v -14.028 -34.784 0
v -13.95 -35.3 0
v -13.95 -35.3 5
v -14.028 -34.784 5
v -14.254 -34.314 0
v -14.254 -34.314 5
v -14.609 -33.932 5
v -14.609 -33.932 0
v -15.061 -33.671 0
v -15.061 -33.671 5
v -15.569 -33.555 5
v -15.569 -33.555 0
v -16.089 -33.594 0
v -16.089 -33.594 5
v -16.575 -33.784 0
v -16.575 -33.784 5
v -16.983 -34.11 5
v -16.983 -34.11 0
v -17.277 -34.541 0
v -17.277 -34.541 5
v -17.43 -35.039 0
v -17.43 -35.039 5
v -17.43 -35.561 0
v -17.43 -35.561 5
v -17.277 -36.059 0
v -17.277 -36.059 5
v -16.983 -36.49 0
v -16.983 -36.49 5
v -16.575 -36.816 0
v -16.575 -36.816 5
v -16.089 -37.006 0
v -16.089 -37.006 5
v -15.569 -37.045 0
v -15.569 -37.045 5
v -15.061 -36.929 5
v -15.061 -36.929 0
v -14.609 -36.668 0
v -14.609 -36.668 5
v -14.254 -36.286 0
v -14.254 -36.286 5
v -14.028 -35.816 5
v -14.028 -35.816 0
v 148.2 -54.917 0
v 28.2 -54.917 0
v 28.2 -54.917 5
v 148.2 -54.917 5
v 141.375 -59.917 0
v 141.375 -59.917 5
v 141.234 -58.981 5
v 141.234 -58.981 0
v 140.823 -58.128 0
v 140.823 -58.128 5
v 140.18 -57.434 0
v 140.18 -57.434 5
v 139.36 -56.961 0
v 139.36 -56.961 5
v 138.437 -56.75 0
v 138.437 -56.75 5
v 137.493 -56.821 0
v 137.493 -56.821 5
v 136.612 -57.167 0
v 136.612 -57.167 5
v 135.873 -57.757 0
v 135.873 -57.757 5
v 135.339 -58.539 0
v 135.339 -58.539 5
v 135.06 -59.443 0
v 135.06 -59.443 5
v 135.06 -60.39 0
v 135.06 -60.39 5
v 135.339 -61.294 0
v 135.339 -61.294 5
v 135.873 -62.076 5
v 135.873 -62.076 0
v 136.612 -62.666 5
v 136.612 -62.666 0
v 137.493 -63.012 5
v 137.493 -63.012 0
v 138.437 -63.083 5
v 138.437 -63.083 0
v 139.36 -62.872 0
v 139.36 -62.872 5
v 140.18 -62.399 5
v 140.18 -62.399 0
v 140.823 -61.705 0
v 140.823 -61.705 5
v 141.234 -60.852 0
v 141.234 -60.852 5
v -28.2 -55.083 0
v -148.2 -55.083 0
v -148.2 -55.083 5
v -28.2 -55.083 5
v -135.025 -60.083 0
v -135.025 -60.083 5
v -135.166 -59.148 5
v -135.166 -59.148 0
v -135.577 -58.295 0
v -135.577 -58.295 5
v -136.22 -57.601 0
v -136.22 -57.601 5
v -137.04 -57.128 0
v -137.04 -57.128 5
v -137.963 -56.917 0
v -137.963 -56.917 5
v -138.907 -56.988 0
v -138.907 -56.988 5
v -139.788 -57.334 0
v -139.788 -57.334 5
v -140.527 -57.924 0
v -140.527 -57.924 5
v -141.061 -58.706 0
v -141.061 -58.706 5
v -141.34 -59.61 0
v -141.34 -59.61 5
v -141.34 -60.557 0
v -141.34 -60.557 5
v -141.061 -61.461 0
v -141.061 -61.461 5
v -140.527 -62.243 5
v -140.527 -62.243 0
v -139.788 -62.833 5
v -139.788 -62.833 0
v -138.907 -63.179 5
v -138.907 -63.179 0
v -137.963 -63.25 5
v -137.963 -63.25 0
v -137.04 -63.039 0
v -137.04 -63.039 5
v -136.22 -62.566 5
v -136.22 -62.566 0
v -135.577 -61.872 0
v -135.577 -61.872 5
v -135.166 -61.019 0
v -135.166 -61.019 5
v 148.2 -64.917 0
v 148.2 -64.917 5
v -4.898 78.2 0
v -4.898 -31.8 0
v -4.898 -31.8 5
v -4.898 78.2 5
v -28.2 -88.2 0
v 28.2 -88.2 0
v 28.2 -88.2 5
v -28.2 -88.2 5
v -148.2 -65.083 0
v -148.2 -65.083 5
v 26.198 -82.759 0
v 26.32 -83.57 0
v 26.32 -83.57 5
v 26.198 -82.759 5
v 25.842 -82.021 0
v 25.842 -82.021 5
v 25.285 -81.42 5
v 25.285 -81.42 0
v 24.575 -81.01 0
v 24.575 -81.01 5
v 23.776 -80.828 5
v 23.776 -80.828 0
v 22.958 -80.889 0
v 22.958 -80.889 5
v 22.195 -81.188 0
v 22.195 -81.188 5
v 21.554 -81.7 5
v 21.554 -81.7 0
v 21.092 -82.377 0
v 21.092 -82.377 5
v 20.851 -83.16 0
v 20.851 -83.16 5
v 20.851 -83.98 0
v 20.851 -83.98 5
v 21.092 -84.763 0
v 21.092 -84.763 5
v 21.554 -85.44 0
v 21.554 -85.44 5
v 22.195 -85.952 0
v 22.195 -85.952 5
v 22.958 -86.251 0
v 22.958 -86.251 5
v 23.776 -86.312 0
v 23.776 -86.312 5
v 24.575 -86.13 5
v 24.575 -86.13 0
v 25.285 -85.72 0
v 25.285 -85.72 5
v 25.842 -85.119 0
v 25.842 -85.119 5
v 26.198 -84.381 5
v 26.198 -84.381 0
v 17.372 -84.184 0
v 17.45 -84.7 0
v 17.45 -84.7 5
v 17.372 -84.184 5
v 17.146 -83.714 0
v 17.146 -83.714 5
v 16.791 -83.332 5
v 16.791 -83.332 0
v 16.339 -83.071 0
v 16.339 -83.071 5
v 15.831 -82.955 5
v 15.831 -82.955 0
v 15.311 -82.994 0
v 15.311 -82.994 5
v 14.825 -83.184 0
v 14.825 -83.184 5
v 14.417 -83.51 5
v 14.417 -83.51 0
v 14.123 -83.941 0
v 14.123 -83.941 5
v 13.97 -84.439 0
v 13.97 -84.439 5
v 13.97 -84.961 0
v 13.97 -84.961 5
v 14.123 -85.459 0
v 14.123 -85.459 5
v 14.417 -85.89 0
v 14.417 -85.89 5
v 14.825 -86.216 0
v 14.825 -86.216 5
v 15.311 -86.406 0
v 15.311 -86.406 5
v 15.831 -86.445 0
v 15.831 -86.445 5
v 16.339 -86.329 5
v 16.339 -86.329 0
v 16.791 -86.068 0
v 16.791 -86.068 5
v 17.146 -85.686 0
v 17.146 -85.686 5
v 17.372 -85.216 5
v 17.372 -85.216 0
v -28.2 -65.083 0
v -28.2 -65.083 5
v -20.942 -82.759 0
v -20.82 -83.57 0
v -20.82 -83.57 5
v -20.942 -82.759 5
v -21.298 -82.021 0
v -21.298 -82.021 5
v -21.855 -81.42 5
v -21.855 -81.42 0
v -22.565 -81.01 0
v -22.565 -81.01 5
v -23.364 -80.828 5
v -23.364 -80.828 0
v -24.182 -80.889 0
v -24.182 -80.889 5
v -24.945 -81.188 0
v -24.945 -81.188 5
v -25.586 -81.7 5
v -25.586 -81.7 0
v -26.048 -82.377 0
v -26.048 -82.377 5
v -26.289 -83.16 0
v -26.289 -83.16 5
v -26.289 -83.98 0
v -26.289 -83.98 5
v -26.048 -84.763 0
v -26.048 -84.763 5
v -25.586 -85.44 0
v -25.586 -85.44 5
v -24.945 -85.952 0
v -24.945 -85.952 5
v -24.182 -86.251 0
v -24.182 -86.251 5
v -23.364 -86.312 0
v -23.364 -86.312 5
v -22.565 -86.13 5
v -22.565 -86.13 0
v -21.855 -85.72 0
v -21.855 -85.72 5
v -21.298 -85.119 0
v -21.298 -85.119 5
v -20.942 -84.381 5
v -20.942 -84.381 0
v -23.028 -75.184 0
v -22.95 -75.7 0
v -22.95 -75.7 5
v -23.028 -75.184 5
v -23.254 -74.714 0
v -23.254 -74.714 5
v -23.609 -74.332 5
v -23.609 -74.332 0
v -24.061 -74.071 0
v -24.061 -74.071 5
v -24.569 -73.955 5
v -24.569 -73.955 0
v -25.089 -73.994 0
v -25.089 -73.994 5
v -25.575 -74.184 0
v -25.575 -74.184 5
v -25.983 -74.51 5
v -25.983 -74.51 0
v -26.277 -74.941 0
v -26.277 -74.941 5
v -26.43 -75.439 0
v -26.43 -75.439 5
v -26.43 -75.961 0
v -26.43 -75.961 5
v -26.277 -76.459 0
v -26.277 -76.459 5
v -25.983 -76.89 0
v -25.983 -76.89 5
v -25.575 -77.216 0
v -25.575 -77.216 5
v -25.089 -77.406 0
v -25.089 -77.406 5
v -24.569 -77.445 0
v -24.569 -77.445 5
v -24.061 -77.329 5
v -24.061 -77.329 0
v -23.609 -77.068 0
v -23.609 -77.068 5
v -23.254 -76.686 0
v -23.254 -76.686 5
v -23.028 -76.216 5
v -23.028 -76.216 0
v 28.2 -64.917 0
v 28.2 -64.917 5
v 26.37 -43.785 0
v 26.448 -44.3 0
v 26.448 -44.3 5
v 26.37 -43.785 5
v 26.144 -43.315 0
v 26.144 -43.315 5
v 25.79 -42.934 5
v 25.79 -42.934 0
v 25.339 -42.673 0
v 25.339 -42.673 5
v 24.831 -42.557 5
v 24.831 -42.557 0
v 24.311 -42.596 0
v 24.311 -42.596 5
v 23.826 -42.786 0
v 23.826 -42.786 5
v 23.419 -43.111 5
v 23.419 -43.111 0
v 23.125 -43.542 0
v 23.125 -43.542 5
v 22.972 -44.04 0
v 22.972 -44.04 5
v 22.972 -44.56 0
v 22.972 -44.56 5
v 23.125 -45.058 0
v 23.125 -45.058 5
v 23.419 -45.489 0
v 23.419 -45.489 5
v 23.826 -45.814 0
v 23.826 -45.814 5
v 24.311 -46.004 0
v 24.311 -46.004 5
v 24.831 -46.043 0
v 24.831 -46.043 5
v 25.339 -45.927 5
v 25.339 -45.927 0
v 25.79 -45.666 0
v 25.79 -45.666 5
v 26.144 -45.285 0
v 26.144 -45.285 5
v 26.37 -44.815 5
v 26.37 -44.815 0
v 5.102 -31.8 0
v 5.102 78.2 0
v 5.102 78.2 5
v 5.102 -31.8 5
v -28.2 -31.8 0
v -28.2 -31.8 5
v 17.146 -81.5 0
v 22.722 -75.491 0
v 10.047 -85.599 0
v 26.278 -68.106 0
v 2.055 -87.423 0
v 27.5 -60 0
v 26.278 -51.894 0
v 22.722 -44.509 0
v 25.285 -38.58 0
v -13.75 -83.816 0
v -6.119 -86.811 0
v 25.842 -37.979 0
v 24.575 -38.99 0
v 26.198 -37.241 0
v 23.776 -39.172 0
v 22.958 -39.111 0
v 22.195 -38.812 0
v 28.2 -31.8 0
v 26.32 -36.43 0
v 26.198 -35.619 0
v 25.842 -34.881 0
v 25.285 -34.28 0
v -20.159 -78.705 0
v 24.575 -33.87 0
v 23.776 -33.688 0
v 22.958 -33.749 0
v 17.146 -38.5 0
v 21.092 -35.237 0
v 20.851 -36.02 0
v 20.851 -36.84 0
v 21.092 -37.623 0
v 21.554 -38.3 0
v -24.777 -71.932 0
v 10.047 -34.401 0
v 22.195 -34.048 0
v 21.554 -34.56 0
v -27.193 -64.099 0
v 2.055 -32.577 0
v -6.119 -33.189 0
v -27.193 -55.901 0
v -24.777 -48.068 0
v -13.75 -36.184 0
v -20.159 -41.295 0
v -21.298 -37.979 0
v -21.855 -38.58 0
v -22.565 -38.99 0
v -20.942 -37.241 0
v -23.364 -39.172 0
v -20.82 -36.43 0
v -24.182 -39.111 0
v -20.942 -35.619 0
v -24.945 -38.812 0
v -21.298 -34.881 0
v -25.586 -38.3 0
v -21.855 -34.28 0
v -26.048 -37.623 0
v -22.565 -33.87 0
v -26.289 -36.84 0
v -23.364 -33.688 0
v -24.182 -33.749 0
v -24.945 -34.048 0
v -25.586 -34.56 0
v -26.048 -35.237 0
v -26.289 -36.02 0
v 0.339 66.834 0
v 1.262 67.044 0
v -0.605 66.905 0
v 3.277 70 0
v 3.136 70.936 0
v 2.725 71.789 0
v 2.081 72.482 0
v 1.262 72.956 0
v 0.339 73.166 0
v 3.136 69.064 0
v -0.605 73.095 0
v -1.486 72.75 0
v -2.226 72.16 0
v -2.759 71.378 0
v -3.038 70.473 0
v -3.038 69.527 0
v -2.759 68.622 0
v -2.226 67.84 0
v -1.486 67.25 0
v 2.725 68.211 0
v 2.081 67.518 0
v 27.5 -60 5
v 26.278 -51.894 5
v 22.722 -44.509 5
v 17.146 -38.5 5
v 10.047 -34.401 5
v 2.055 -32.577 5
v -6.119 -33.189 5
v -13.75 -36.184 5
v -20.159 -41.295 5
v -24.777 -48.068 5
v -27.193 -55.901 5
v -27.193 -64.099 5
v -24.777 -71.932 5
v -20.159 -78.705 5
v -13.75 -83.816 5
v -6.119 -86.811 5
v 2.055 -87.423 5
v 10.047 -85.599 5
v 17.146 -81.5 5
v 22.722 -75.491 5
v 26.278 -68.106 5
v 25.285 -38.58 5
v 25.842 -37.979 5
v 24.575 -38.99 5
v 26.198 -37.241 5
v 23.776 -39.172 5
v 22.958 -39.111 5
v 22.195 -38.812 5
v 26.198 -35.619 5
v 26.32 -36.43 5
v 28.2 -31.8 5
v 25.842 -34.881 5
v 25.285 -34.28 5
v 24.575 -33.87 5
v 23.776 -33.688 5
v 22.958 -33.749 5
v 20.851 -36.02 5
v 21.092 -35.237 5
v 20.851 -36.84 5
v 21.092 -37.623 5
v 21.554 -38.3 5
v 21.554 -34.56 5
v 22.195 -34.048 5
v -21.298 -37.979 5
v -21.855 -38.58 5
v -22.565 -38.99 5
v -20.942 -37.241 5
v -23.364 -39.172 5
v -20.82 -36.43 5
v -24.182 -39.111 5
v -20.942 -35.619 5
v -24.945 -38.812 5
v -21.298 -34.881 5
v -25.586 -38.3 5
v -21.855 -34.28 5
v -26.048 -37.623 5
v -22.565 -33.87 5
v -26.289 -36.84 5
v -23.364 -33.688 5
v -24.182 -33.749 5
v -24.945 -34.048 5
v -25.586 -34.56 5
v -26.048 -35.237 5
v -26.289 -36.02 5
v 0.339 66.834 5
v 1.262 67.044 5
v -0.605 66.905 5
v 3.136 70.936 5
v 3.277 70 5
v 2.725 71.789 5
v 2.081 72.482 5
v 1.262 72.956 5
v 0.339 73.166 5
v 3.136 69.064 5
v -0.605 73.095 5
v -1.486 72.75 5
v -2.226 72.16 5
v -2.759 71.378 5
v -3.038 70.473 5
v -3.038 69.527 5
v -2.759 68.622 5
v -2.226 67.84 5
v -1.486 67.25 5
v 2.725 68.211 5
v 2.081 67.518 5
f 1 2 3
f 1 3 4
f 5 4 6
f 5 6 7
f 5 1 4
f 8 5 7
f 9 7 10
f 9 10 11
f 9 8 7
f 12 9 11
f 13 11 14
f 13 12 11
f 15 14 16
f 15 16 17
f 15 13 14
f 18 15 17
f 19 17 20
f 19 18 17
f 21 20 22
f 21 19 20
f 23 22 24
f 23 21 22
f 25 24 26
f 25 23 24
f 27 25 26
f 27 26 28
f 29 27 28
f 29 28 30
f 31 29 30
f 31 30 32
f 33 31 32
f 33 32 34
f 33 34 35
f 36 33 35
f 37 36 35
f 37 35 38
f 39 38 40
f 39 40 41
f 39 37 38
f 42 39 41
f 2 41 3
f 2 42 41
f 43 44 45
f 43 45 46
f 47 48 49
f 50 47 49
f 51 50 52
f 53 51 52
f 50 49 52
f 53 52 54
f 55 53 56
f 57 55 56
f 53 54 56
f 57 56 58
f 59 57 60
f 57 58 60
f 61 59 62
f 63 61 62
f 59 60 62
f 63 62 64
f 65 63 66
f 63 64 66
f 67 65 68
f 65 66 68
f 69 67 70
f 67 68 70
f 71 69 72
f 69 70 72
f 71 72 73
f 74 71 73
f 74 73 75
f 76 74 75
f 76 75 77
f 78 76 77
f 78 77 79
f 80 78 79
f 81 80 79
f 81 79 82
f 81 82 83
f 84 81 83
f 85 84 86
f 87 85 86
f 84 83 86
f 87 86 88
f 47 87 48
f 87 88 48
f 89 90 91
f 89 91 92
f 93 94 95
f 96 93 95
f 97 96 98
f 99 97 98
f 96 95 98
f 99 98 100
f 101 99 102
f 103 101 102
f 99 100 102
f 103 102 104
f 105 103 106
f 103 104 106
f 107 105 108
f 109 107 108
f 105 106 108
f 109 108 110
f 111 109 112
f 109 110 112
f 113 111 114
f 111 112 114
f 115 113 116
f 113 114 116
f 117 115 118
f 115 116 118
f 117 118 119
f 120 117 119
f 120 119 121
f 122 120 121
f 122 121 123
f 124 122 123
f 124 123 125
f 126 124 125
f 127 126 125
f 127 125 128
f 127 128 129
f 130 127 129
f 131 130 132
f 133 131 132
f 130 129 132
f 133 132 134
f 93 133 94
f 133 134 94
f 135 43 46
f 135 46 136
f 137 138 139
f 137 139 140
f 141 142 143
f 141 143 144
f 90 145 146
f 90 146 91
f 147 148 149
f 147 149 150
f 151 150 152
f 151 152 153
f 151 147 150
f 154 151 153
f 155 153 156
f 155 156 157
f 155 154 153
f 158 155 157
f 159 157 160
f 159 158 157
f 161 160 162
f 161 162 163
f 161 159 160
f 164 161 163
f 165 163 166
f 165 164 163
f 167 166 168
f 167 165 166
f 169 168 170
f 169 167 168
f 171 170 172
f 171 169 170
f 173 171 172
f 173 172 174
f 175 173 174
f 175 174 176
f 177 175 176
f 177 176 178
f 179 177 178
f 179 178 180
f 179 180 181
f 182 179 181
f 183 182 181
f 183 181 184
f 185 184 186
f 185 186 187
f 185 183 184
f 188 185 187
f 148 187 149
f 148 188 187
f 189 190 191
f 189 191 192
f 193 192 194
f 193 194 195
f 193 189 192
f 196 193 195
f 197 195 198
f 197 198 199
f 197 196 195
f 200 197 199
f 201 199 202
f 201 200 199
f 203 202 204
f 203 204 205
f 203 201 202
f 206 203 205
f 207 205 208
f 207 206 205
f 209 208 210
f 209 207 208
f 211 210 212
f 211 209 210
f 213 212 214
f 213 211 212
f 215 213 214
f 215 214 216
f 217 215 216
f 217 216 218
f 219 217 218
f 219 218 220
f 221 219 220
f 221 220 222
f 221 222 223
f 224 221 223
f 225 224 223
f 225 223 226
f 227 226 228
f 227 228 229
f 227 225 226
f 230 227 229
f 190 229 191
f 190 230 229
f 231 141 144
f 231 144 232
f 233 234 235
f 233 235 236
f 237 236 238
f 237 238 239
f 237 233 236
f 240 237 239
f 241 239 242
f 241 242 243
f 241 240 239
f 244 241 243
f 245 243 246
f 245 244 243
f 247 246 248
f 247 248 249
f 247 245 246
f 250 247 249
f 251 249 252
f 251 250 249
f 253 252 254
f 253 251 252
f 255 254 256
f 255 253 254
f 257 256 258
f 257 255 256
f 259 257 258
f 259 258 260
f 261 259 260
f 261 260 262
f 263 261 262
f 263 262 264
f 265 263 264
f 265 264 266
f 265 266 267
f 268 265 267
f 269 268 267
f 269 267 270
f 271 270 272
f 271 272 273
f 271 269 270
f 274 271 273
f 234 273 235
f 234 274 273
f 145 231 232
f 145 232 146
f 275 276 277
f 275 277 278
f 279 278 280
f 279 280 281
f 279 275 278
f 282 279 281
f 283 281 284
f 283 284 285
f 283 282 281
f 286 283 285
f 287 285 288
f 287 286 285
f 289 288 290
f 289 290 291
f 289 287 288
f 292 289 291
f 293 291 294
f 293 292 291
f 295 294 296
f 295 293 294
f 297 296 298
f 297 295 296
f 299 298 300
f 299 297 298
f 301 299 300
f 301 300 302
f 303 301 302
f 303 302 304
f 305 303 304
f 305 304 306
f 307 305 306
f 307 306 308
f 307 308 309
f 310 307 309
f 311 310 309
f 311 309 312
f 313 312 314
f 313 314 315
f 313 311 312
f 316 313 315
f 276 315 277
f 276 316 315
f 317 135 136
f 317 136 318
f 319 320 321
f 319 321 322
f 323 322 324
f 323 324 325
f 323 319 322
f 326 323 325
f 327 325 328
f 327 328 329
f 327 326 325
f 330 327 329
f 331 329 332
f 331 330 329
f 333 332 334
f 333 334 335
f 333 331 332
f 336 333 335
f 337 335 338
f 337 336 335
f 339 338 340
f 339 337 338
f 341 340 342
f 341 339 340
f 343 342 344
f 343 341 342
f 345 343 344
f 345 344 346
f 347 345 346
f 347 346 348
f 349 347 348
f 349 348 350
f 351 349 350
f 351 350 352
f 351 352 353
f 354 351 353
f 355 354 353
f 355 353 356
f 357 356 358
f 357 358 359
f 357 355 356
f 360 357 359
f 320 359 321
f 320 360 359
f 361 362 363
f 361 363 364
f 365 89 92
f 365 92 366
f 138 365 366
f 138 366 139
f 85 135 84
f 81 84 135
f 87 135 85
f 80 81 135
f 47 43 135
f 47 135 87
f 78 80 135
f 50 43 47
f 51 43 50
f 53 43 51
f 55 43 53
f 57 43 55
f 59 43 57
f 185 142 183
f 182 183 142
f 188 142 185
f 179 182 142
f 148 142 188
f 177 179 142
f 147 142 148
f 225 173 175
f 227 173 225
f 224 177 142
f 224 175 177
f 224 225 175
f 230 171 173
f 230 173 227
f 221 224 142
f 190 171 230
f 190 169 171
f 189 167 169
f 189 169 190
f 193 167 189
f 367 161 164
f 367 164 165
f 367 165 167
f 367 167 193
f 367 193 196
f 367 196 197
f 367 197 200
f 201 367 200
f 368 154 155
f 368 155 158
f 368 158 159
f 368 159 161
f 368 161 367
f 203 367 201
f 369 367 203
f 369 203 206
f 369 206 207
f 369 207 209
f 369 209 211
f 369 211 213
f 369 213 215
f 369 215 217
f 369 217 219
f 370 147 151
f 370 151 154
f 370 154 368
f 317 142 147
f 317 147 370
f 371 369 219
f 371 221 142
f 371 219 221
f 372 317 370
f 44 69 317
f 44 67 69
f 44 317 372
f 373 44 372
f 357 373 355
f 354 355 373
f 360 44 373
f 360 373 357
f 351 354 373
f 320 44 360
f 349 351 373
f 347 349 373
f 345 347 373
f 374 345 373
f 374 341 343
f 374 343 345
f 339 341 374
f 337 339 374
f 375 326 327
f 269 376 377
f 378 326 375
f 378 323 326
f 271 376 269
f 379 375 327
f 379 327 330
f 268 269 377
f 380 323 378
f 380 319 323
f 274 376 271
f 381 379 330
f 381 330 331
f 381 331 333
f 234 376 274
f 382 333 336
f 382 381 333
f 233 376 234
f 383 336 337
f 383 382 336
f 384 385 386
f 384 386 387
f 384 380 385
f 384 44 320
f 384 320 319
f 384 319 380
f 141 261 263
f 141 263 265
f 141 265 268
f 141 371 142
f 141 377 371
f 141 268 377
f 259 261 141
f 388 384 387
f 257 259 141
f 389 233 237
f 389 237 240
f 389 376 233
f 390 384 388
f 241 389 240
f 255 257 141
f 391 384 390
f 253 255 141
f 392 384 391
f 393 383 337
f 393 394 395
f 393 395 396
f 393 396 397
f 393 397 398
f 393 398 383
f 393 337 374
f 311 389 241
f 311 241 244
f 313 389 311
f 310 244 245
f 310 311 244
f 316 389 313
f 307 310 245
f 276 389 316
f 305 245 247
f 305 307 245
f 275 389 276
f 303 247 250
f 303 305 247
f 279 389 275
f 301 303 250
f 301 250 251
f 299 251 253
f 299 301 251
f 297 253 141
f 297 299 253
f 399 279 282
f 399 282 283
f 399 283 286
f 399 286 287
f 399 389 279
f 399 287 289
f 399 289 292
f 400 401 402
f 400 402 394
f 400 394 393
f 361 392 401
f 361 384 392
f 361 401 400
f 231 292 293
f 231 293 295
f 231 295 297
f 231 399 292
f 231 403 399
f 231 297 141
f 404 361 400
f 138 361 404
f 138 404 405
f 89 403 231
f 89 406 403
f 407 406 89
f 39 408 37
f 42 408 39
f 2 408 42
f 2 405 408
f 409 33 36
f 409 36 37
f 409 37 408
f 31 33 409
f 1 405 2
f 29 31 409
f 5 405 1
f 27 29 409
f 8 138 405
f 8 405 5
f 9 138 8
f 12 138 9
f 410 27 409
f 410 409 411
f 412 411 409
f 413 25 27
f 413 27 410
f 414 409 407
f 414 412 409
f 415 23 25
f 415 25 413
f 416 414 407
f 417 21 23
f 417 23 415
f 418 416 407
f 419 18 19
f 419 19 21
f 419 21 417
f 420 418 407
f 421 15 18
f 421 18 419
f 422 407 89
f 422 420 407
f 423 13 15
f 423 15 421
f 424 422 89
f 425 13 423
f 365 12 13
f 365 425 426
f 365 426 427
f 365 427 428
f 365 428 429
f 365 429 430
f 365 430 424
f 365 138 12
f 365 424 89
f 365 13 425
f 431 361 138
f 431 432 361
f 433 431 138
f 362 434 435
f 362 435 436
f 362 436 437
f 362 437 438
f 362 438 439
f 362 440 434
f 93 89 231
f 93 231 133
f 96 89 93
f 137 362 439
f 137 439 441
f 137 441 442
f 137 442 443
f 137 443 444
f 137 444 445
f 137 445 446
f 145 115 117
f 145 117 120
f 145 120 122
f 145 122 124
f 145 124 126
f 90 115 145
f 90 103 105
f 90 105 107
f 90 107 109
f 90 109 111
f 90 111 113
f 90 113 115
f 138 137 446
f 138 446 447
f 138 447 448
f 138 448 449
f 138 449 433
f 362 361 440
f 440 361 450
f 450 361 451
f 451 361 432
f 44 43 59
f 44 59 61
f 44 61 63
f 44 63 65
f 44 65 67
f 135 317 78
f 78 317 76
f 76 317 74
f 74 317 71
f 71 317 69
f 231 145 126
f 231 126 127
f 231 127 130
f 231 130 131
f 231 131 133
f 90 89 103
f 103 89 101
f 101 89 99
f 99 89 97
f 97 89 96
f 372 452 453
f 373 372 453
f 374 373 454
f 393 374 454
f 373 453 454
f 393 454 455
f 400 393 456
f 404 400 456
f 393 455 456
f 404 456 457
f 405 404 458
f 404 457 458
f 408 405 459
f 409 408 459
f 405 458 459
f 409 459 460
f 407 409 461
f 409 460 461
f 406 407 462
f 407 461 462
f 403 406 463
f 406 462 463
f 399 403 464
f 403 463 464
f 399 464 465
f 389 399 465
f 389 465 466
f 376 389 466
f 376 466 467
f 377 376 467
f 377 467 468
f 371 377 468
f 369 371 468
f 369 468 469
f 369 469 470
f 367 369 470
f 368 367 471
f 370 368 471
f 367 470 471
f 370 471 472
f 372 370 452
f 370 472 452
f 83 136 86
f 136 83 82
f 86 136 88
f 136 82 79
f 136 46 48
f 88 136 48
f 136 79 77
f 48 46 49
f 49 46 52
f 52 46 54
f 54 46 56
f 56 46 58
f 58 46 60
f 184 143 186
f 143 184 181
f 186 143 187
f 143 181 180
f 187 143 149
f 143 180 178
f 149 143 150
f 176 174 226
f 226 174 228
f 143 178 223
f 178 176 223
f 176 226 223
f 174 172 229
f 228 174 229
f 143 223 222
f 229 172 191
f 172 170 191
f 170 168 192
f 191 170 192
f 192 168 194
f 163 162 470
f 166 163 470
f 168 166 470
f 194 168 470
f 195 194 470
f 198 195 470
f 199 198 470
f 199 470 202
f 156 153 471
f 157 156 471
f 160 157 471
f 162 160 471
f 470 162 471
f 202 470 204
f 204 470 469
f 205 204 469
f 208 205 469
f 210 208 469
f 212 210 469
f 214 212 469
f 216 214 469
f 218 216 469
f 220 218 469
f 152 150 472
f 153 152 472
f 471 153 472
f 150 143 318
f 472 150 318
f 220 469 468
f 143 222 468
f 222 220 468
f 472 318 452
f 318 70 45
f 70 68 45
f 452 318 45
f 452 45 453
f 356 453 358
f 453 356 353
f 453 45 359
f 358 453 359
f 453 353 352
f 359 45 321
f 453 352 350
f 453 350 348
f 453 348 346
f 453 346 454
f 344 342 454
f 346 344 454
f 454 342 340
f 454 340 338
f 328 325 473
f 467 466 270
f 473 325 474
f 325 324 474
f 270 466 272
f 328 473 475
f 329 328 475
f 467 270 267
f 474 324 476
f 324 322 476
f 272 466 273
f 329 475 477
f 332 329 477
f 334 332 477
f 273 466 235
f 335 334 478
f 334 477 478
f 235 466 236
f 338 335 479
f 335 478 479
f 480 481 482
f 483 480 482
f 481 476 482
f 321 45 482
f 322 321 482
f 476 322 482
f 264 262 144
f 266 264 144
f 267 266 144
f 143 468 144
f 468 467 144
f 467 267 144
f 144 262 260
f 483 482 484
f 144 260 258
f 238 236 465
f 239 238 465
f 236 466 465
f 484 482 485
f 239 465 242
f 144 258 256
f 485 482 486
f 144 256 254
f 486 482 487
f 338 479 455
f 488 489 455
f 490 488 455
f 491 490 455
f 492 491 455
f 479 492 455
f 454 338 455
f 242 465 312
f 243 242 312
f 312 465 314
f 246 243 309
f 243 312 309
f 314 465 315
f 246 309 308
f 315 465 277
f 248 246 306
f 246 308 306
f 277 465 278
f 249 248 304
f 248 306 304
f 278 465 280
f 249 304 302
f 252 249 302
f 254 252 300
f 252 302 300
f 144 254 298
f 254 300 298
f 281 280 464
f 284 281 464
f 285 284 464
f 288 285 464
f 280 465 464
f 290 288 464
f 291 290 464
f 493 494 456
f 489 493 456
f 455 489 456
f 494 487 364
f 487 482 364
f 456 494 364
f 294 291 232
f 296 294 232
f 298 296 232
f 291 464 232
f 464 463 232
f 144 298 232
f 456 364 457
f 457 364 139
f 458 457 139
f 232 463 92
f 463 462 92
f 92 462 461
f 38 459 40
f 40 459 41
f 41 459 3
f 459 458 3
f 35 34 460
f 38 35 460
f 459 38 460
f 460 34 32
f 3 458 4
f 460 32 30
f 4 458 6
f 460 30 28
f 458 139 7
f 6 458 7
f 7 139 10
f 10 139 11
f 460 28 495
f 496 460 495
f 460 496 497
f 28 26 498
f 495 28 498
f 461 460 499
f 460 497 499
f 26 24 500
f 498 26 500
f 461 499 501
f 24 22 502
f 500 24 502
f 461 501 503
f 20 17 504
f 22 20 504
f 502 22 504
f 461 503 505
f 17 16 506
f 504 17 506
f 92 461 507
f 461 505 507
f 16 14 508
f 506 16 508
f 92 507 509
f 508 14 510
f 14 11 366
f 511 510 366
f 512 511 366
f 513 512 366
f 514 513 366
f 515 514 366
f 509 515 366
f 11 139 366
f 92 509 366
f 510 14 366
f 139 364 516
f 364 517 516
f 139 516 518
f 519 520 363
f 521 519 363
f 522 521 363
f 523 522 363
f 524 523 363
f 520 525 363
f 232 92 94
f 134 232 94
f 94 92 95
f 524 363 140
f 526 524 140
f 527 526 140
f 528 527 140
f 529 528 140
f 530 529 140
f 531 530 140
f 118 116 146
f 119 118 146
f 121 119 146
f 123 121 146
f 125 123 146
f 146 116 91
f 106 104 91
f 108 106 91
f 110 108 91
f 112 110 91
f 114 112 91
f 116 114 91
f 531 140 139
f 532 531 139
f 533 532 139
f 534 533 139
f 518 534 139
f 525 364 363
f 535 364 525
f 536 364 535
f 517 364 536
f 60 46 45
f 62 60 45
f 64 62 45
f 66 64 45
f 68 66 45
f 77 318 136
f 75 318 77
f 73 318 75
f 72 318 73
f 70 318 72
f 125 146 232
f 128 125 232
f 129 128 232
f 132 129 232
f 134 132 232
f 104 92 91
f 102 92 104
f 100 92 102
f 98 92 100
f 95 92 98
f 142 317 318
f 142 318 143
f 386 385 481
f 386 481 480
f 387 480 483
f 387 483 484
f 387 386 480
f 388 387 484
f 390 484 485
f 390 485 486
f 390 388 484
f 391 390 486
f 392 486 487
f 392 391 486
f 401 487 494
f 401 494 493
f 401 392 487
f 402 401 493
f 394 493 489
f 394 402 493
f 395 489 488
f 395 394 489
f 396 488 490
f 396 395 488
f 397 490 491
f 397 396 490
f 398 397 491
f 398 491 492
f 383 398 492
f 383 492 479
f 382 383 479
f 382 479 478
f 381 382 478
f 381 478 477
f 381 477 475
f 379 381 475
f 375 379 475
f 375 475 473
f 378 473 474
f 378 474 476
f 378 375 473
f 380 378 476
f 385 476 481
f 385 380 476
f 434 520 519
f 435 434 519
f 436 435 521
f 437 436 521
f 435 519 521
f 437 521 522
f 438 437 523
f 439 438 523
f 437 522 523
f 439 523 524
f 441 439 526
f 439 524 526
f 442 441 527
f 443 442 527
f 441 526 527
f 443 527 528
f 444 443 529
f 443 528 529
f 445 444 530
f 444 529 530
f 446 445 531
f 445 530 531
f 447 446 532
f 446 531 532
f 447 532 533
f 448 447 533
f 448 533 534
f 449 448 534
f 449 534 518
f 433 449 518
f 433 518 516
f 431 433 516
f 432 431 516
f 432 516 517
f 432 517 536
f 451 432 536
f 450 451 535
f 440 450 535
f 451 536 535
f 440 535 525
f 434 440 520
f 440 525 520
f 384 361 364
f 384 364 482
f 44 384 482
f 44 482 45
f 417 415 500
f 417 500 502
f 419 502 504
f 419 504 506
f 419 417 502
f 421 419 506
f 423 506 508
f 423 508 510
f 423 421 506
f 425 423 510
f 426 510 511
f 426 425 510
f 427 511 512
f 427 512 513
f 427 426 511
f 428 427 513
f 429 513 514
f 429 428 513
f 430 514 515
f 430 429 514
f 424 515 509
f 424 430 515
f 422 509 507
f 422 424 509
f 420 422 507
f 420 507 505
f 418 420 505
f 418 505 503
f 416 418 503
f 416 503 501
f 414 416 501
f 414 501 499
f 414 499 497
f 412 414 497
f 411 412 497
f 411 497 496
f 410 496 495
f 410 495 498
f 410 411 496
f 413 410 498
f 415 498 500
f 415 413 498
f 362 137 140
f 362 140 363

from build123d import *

# Parameters (mm, degrees)
CROQUIS1_R              = 2.75
CROQUIS1_R_2            = 1.75
CROQUIS1_R_3            = 1.747778747
CROQUIS1_R_4            = 7.725412866
SALIENTE_EXTRUIR1_DEPTH = 5
CROQUIS2_R              = 3.175
CROQUIS2_R_2            = 27.5
CORTAR_EXTRUIR1_DEPTH   = 5


with BuildPart() as part:
    # Croquis1 → Saliente-Extruir1 (new body)
    with BuildSketch(Plane.XY):
        Polygon((-28.2, -55.083487529), (-28.2, -31.8), (-4.898409704, -31.8), (-4.898409704, 78.2), (5.101590296, 78.2), (5.101590296, -31.8), (28.2, -31.8), (28.2, -54.916512471), (148.2, -54.916512471), (148.2, -64.916512471), (28.2, -64.916512471), (28.2, -88.2), (-28.2, -88.2), (-28.2, -65.083487529), (-148.2, -65.083487529), (-148.2, -55.083487529), align=None)
        with Locations((-23.57, -36.43)):
            Circle(CROQUIS1_R, mode=Mode.SUBTRACT)
        with Locations((23.57, -36.43)):
            Circle(CROQUIS1_R, mode=Mode.SUBTRACT)
        with Locations((23.57, -83.57)):
            Circle(CROQUIS1_R, mode=Mode.SUBTRACT)
        with Locations((-23.57, -83.57)):
            Circle(CROQUIS1_R, mode=Mode.SUBTRACT)
        with Locations((-15.7, -35.3)):
            Circle(CROQUIS1_R_2, mode=Mode.SUBTRACT)
        with Locations((24.7, -44.3)):
            Circle(CROQUIS1_R_3, mode=Mode.SUBTRACT)
        with Locations((15.7, -84.7)):
            Circle(CROQUIS1_R_2, mode=Mode.SUBTRACT)
        with Locations((-24.7, -75.7)):
            Circle(CROQUIS1_R_2, mode=Mode.SUBTRACT)
        with Locations((0, -60)):
            Circle(CROQUIS1_R_4, mode=Mode.SUBTRACT)
    extrude(amount=SALIENTE_EXTRUIR1_DEPTH)

    # Croquis2 → Cortar-Extruir1 (cut)
    with BuildSketch(Plane.XY.offset(5)):
        with Locations((0.101590296, 70)):
            Circle(CROQUIS2_R)
        with Locations((138.2, -59.916512471)):
            Circle(CROQUIS2_R)
        with Locations((-138.2, -60.083487529)):
            Circle(CROQUIS2_R)
        with Locations((0, -60)):
            Circle(CROQUIS2_R_2)
    extrude(amount=-CORTAR_EXTRUIR1_DEPTH, mode=Mode.SUBTRACT)


solid = part.part
